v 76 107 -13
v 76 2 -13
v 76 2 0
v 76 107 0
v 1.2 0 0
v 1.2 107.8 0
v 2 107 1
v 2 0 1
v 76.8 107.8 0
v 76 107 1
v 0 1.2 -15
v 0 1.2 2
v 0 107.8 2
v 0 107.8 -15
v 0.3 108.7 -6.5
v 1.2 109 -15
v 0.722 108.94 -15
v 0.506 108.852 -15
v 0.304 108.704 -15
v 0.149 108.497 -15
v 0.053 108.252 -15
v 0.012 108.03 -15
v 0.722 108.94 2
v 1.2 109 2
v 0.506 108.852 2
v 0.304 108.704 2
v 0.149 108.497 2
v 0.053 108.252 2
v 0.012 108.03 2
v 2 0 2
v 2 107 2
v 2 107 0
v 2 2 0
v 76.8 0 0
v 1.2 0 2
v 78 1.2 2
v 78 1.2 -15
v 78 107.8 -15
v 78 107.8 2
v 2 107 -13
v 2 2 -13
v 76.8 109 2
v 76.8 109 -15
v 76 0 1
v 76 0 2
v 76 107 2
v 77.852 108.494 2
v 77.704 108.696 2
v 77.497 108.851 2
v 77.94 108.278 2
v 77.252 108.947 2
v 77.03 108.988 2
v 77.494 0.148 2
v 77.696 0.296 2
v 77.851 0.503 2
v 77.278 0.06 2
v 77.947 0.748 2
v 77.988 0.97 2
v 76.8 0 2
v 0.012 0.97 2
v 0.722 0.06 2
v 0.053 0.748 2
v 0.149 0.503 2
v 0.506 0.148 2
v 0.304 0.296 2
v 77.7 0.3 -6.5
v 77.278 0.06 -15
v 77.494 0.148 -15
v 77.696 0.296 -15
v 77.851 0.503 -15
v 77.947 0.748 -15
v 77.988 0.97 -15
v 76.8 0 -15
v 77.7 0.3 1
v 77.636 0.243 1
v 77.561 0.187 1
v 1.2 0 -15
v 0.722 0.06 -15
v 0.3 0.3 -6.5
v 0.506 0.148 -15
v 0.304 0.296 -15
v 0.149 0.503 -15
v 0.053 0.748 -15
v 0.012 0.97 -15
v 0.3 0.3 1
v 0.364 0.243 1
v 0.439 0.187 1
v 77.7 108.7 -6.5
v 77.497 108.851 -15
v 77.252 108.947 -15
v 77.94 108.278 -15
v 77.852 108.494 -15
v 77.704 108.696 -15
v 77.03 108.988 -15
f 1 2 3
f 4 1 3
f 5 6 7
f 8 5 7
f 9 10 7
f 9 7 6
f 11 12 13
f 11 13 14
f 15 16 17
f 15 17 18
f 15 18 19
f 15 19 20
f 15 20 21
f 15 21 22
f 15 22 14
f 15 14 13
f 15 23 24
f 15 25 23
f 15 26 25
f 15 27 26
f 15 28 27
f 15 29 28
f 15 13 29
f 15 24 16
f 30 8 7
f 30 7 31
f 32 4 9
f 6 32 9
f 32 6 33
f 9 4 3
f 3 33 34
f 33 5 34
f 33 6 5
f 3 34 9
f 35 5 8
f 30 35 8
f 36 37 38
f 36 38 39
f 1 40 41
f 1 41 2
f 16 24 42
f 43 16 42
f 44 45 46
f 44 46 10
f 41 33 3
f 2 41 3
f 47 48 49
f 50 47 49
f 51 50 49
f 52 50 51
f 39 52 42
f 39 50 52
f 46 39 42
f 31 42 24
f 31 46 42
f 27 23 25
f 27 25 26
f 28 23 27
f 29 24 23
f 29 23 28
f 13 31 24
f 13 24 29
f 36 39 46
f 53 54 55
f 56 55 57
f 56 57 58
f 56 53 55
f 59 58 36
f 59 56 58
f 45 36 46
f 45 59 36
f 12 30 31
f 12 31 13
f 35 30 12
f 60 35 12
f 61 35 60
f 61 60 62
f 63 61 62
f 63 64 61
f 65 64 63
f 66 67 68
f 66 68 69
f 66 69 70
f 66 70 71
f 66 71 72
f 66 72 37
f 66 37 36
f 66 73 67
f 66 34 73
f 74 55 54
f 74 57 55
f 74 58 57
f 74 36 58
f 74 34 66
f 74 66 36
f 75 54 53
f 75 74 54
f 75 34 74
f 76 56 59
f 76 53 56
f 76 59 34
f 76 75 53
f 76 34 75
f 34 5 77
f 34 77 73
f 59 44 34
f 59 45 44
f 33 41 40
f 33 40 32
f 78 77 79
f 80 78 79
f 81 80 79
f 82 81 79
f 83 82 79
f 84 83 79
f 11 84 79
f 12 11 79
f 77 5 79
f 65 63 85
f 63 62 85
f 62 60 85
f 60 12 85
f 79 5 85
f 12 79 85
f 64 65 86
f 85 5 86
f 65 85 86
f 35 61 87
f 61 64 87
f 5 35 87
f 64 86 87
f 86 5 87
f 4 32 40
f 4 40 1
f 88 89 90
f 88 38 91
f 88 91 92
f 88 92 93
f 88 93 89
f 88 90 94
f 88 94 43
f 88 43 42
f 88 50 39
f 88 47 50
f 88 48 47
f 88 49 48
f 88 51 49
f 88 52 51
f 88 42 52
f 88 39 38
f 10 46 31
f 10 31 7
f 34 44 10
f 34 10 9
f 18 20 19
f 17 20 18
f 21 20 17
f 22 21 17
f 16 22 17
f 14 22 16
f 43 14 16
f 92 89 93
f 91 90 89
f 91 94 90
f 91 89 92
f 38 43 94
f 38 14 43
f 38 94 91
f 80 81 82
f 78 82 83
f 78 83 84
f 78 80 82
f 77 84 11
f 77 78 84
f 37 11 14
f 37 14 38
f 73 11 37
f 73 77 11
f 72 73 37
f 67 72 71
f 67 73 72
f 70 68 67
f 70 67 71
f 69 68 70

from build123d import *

# Parameters (mm, degrees)
F0_W        = 78
F0_H        = 15
F1_DEPTH    = 109
F2_T        = -2
F4_DEPTH    = 109
F6_DEPTH    = 78
F7_T1_DEPTH = 23


# Not quite as in the source:
# - a fillet or chamfer that OpenCascade refuses, or shapes differently, is made with other operations: its cross-section is extruded or revolved along the edge and cut away or added


with BuildPart() as f1:
    # F0 (on Front) → F1 (new body)
    with BuildSketch(Plane.XZ):
        with Locations((39, -7.5)):
            Rectangle(F0_W, F0_H)
    extrude(amount=-F1_DEPTH)

    # F2
    f2_openings = [f1.faces().sort_by_distance(p)[0] for p in [
        (39, 54.5, 0),
    ]]
    offset(amount=F2_T, openings=f2_openings)

    # F3 (on face) → F4 (join, through all)
    with BuildSketch(Plane.XZ):
        Polygon((0, 2), (0, 0), (1.2, 0), (2, 1), (2, 2), align=None)
        Polygon((76, 1), (76.8, 0), (78, 0), (78, 2), (76, 2), align=None)
    extrude(amount=-F4_DEPTH)

    # F5 (on face) → F6 (join, through all)
    with BuildSketch(Plane.YZ.offset(78)):
        Polygon((109, 0), (109, 2), (107, 2), (107, 1), (107.8, 0), align=None)
    extrude(amount=-F6_DEPTH)

    # F7: fillet of radius 1.2 on 4 edges, made by hand

    # F7_s2 → F7_t1 (cut)
    with BuildSketch(Plane.XY.offset(-18)):
        with BuildLine():
            add(Edge.make_bspline(
                [(78, 1.2), (78, 0), (76.8, 0)],
                knots=[0, 0, 0, 1, 1, 1], degree=2, weights=[1, 1, 1]))
            Line((76.8, 0), (78, 0))
            Line((78, 0), (78, 1.2))
        make_face()
        with BuildLine():
            add(Edge.make_bspline(
                [(76.8, 109), (78, 109), (78, 107.8)],
                knots=[0, 0, 0, 1, 1, 1], degree=2, weights=[1, 1, 1]))
            Line((78, 107.8), (78, 109))
            Line((78, 109), (76.8, 109))
        make_face()
        with BuildLine():
            add(Edge.make_bspline(
                [(0, 107.8), (0, 109), (1.2, 109)],
                knots=[0, 0, 0, 1, 1, 1], degree=2, weights=[1, 1, 1]))
            Line((1.2, 109), (0, 109))
            Line((0, 109), (0, 107.8))
        make_face()
        with BuildLine():
            add(Edge.make_bspline(
                [(0, 1.2), (0, 0), (1.2, 0)],
                knots=[0, 0, 0, 1, 1, 1], degree=2, weights=[1, 1, 1]))
            Line((1.2, 0), (0, 0))
            Line((0, 0), (0, 1.2))
        make_face()
    extrude(amount=F7_T1_DEPTH, mode=Mode.SUBTRACT)


solid = f1.part
